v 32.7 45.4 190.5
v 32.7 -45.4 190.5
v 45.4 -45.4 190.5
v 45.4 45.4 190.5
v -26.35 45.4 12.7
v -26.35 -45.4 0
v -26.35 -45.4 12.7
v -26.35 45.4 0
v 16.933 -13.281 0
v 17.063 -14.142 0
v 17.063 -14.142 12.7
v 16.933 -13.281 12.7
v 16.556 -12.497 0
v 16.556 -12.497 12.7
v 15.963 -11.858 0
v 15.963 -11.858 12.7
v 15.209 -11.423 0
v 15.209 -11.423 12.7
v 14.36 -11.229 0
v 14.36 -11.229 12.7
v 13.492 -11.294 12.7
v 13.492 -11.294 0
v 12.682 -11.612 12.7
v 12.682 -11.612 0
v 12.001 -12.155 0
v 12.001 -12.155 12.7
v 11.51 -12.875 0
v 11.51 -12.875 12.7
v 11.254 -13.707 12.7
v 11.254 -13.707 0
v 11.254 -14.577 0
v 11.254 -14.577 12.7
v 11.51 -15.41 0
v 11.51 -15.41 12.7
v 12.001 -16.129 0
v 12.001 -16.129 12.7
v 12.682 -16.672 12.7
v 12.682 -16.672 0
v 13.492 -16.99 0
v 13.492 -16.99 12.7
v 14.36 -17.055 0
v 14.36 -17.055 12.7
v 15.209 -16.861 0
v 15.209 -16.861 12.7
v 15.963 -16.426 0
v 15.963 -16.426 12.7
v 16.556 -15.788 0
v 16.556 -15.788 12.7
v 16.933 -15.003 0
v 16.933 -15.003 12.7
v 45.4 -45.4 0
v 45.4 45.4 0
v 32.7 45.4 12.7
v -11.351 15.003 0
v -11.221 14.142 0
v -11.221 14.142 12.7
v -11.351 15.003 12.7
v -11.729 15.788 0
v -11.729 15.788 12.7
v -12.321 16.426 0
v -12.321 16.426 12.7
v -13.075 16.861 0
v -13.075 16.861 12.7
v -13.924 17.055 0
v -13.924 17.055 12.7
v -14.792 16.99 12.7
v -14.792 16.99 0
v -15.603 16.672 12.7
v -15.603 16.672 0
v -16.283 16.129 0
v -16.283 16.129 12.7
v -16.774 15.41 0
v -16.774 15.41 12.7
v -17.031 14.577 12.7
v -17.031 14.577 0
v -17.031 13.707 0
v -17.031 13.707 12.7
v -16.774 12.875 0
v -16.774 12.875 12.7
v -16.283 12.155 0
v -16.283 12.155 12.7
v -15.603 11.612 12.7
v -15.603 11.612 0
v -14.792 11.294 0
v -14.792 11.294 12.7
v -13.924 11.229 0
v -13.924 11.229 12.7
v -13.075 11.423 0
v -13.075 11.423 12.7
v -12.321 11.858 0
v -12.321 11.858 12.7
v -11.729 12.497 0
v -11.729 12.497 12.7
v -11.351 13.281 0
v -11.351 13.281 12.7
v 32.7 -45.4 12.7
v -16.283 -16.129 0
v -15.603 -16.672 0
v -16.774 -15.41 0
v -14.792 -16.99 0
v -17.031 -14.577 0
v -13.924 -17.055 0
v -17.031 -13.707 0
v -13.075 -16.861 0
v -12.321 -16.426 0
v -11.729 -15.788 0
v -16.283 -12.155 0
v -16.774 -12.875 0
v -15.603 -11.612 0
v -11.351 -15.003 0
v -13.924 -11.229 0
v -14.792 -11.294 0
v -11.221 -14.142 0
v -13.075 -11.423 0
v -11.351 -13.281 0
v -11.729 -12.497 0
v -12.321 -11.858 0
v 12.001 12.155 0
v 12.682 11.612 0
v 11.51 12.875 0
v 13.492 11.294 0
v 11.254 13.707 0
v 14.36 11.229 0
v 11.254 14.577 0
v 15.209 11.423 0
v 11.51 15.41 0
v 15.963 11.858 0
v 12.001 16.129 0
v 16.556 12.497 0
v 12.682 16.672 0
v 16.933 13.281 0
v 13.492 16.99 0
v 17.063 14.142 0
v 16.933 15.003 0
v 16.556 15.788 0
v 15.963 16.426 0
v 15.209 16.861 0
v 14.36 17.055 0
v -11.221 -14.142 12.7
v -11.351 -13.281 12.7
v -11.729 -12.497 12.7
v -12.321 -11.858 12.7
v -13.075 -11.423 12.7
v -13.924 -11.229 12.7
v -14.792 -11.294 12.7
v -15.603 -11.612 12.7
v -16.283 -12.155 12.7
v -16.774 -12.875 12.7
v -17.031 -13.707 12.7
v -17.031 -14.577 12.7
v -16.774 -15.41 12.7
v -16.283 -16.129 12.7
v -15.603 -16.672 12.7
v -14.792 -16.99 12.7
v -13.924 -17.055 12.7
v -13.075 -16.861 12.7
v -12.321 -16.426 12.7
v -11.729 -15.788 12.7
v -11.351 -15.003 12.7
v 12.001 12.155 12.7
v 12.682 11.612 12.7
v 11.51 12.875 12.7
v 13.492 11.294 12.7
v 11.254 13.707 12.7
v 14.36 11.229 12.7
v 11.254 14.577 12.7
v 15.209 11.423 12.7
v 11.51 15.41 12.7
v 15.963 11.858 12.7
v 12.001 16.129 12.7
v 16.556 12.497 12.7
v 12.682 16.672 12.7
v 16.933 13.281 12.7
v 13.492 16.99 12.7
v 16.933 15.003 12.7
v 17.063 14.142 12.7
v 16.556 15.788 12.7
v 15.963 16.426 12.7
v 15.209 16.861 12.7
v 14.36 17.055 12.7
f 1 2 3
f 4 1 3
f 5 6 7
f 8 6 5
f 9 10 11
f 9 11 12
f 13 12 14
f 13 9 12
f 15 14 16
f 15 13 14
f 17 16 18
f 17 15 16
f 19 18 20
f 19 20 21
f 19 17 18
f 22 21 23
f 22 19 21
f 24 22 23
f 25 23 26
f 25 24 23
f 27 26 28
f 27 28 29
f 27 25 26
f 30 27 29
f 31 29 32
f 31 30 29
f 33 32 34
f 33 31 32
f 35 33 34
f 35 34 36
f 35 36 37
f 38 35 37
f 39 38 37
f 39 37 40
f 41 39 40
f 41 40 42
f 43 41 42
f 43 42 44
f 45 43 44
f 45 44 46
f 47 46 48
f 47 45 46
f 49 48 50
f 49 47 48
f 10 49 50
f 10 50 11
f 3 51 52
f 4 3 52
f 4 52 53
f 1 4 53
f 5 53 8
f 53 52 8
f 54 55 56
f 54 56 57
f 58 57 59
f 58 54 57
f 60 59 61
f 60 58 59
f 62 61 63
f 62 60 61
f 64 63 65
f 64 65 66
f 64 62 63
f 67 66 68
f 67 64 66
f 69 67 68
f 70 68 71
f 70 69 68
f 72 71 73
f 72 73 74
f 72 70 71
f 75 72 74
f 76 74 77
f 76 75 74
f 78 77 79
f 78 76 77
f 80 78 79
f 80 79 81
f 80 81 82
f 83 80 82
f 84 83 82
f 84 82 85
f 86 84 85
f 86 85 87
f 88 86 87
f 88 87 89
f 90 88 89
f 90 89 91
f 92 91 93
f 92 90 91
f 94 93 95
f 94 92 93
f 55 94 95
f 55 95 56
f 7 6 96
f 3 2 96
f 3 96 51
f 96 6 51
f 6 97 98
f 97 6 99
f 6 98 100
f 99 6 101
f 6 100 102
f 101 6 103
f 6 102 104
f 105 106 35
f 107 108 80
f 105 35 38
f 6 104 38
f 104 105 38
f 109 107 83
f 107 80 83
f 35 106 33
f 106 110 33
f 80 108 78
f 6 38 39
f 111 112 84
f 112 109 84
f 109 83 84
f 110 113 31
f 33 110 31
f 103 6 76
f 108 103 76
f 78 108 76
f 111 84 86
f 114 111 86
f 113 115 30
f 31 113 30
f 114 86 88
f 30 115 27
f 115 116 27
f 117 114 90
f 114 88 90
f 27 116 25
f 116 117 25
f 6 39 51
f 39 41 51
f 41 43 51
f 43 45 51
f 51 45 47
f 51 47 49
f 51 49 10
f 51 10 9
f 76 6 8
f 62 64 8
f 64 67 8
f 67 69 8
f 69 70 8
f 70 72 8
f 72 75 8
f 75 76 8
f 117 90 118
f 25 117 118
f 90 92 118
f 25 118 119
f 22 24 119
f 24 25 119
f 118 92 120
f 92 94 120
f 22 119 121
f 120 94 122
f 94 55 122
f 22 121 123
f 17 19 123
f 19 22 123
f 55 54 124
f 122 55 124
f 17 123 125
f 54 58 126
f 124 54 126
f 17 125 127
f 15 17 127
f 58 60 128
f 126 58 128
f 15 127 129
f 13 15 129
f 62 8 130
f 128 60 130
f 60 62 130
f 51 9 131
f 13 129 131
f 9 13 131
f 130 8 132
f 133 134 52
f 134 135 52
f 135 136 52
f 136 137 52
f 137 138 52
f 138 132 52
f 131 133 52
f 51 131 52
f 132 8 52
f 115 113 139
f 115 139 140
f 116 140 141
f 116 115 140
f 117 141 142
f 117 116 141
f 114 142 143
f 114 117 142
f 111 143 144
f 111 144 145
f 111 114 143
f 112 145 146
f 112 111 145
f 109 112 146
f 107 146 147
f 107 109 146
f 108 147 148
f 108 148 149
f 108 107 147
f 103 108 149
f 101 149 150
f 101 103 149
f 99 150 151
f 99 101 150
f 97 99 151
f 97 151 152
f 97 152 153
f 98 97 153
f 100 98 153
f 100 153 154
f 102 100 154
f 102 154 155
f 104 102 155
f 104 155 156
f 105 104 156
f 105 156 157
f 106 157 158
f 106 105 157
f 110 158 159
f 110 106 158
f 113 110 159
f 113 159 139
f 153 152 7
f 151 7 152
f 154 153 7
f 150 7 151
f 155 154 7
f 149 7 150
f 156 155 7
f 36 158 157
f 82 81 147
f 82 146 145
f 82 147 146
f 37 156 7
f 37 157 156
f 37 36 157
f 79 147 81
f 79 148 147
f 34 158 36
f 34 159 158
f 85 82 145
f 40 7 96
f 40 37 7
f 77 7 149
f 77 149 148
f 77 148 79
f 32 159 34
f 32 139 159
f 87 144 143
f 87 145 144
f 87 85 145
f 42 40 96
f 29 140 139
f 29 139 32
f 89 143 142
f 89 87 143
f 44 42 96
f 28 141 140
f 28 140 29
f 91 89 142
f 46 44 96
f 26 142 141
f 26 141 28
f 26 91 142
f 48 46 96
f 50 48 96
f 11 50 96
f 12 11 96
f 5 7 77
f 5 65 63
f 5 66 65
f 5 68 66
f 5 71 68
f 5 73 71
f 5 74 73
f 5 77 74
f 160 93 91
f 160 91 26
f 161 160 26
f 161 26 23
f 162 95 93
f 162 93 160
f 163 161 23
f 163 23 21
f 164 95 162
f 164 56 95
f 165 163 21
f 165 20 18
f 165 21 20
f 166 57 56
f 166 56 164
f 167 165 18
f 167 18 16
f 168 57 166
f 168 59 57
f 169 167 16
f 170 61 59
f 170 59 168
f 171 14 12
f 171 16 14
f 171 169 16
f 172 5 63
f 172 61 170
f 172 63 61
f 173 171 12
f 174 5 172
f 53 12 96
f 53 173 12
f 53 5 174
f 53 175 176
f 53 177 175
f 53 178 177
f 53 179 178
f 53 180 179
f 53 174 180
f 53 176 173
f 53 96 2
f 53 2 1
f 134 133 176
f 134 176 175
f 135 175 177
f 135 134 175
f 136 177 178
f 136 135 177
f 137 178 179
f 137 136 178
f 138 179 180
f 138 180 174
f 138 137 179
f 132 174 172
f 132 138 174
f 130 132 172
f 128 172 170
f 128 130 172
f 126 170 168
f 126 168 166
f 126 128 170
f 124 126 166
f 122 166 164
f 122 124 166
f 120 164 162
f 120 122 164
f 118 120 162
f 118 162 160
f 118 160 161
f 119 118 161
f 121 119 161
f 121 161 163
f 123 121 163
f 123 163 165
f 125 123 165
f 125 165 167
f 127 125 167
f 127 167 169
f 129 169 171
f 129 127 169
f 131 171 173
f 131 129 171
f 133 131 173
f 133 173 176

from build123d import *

# Parameters (mm, degrees)
F0_W     = 12.7
F0_H     = 90.8
F0_W_2   = 59.05
F0_R     = 2.921
F1_DEPTH = 12.7
F2_DEPTH = 190.5


with BuildPart() as f1:
    # F0 (on Top) → F1 (new body)
    with BuildSketch(Plane.XY):
        with Locations((39.05, 0)):
            Rectangle(F0_W, F0_H)
        with Locations((3.175, 0)):
            Rectangle(F0_W_2, F0_H)
        with Locations((-14.142136, -14.142136)):
            Circle(F0_R, mode=Mode.SUBTRACT)
        with Locations((14.142136, -14.142136)):
            Circle(F0_R, mode=Mode.SUBTRACT)
        with Locations((-14.142136, 14.142136)):
            Circle(F0_R, mode=Mode.SUBTRACT)
        with Locations((14.142136, 14.142136)):
            Circle(F0_R, mode=Mode.SUBTRACT)
    extrude(amount=F1_DEPTH)

    # F0 (on Top) → F2 (join)
    with BuildSketch(Plane.XY):
        with Locations((39.05, 0)):
            Rectangle(F0_W, F0_H)
    extrude(amount=F2_DEPTH)


with BuildPart() as f3_1:
    # F3: copy of F1
    add(f1.part)


solid = f1.part
